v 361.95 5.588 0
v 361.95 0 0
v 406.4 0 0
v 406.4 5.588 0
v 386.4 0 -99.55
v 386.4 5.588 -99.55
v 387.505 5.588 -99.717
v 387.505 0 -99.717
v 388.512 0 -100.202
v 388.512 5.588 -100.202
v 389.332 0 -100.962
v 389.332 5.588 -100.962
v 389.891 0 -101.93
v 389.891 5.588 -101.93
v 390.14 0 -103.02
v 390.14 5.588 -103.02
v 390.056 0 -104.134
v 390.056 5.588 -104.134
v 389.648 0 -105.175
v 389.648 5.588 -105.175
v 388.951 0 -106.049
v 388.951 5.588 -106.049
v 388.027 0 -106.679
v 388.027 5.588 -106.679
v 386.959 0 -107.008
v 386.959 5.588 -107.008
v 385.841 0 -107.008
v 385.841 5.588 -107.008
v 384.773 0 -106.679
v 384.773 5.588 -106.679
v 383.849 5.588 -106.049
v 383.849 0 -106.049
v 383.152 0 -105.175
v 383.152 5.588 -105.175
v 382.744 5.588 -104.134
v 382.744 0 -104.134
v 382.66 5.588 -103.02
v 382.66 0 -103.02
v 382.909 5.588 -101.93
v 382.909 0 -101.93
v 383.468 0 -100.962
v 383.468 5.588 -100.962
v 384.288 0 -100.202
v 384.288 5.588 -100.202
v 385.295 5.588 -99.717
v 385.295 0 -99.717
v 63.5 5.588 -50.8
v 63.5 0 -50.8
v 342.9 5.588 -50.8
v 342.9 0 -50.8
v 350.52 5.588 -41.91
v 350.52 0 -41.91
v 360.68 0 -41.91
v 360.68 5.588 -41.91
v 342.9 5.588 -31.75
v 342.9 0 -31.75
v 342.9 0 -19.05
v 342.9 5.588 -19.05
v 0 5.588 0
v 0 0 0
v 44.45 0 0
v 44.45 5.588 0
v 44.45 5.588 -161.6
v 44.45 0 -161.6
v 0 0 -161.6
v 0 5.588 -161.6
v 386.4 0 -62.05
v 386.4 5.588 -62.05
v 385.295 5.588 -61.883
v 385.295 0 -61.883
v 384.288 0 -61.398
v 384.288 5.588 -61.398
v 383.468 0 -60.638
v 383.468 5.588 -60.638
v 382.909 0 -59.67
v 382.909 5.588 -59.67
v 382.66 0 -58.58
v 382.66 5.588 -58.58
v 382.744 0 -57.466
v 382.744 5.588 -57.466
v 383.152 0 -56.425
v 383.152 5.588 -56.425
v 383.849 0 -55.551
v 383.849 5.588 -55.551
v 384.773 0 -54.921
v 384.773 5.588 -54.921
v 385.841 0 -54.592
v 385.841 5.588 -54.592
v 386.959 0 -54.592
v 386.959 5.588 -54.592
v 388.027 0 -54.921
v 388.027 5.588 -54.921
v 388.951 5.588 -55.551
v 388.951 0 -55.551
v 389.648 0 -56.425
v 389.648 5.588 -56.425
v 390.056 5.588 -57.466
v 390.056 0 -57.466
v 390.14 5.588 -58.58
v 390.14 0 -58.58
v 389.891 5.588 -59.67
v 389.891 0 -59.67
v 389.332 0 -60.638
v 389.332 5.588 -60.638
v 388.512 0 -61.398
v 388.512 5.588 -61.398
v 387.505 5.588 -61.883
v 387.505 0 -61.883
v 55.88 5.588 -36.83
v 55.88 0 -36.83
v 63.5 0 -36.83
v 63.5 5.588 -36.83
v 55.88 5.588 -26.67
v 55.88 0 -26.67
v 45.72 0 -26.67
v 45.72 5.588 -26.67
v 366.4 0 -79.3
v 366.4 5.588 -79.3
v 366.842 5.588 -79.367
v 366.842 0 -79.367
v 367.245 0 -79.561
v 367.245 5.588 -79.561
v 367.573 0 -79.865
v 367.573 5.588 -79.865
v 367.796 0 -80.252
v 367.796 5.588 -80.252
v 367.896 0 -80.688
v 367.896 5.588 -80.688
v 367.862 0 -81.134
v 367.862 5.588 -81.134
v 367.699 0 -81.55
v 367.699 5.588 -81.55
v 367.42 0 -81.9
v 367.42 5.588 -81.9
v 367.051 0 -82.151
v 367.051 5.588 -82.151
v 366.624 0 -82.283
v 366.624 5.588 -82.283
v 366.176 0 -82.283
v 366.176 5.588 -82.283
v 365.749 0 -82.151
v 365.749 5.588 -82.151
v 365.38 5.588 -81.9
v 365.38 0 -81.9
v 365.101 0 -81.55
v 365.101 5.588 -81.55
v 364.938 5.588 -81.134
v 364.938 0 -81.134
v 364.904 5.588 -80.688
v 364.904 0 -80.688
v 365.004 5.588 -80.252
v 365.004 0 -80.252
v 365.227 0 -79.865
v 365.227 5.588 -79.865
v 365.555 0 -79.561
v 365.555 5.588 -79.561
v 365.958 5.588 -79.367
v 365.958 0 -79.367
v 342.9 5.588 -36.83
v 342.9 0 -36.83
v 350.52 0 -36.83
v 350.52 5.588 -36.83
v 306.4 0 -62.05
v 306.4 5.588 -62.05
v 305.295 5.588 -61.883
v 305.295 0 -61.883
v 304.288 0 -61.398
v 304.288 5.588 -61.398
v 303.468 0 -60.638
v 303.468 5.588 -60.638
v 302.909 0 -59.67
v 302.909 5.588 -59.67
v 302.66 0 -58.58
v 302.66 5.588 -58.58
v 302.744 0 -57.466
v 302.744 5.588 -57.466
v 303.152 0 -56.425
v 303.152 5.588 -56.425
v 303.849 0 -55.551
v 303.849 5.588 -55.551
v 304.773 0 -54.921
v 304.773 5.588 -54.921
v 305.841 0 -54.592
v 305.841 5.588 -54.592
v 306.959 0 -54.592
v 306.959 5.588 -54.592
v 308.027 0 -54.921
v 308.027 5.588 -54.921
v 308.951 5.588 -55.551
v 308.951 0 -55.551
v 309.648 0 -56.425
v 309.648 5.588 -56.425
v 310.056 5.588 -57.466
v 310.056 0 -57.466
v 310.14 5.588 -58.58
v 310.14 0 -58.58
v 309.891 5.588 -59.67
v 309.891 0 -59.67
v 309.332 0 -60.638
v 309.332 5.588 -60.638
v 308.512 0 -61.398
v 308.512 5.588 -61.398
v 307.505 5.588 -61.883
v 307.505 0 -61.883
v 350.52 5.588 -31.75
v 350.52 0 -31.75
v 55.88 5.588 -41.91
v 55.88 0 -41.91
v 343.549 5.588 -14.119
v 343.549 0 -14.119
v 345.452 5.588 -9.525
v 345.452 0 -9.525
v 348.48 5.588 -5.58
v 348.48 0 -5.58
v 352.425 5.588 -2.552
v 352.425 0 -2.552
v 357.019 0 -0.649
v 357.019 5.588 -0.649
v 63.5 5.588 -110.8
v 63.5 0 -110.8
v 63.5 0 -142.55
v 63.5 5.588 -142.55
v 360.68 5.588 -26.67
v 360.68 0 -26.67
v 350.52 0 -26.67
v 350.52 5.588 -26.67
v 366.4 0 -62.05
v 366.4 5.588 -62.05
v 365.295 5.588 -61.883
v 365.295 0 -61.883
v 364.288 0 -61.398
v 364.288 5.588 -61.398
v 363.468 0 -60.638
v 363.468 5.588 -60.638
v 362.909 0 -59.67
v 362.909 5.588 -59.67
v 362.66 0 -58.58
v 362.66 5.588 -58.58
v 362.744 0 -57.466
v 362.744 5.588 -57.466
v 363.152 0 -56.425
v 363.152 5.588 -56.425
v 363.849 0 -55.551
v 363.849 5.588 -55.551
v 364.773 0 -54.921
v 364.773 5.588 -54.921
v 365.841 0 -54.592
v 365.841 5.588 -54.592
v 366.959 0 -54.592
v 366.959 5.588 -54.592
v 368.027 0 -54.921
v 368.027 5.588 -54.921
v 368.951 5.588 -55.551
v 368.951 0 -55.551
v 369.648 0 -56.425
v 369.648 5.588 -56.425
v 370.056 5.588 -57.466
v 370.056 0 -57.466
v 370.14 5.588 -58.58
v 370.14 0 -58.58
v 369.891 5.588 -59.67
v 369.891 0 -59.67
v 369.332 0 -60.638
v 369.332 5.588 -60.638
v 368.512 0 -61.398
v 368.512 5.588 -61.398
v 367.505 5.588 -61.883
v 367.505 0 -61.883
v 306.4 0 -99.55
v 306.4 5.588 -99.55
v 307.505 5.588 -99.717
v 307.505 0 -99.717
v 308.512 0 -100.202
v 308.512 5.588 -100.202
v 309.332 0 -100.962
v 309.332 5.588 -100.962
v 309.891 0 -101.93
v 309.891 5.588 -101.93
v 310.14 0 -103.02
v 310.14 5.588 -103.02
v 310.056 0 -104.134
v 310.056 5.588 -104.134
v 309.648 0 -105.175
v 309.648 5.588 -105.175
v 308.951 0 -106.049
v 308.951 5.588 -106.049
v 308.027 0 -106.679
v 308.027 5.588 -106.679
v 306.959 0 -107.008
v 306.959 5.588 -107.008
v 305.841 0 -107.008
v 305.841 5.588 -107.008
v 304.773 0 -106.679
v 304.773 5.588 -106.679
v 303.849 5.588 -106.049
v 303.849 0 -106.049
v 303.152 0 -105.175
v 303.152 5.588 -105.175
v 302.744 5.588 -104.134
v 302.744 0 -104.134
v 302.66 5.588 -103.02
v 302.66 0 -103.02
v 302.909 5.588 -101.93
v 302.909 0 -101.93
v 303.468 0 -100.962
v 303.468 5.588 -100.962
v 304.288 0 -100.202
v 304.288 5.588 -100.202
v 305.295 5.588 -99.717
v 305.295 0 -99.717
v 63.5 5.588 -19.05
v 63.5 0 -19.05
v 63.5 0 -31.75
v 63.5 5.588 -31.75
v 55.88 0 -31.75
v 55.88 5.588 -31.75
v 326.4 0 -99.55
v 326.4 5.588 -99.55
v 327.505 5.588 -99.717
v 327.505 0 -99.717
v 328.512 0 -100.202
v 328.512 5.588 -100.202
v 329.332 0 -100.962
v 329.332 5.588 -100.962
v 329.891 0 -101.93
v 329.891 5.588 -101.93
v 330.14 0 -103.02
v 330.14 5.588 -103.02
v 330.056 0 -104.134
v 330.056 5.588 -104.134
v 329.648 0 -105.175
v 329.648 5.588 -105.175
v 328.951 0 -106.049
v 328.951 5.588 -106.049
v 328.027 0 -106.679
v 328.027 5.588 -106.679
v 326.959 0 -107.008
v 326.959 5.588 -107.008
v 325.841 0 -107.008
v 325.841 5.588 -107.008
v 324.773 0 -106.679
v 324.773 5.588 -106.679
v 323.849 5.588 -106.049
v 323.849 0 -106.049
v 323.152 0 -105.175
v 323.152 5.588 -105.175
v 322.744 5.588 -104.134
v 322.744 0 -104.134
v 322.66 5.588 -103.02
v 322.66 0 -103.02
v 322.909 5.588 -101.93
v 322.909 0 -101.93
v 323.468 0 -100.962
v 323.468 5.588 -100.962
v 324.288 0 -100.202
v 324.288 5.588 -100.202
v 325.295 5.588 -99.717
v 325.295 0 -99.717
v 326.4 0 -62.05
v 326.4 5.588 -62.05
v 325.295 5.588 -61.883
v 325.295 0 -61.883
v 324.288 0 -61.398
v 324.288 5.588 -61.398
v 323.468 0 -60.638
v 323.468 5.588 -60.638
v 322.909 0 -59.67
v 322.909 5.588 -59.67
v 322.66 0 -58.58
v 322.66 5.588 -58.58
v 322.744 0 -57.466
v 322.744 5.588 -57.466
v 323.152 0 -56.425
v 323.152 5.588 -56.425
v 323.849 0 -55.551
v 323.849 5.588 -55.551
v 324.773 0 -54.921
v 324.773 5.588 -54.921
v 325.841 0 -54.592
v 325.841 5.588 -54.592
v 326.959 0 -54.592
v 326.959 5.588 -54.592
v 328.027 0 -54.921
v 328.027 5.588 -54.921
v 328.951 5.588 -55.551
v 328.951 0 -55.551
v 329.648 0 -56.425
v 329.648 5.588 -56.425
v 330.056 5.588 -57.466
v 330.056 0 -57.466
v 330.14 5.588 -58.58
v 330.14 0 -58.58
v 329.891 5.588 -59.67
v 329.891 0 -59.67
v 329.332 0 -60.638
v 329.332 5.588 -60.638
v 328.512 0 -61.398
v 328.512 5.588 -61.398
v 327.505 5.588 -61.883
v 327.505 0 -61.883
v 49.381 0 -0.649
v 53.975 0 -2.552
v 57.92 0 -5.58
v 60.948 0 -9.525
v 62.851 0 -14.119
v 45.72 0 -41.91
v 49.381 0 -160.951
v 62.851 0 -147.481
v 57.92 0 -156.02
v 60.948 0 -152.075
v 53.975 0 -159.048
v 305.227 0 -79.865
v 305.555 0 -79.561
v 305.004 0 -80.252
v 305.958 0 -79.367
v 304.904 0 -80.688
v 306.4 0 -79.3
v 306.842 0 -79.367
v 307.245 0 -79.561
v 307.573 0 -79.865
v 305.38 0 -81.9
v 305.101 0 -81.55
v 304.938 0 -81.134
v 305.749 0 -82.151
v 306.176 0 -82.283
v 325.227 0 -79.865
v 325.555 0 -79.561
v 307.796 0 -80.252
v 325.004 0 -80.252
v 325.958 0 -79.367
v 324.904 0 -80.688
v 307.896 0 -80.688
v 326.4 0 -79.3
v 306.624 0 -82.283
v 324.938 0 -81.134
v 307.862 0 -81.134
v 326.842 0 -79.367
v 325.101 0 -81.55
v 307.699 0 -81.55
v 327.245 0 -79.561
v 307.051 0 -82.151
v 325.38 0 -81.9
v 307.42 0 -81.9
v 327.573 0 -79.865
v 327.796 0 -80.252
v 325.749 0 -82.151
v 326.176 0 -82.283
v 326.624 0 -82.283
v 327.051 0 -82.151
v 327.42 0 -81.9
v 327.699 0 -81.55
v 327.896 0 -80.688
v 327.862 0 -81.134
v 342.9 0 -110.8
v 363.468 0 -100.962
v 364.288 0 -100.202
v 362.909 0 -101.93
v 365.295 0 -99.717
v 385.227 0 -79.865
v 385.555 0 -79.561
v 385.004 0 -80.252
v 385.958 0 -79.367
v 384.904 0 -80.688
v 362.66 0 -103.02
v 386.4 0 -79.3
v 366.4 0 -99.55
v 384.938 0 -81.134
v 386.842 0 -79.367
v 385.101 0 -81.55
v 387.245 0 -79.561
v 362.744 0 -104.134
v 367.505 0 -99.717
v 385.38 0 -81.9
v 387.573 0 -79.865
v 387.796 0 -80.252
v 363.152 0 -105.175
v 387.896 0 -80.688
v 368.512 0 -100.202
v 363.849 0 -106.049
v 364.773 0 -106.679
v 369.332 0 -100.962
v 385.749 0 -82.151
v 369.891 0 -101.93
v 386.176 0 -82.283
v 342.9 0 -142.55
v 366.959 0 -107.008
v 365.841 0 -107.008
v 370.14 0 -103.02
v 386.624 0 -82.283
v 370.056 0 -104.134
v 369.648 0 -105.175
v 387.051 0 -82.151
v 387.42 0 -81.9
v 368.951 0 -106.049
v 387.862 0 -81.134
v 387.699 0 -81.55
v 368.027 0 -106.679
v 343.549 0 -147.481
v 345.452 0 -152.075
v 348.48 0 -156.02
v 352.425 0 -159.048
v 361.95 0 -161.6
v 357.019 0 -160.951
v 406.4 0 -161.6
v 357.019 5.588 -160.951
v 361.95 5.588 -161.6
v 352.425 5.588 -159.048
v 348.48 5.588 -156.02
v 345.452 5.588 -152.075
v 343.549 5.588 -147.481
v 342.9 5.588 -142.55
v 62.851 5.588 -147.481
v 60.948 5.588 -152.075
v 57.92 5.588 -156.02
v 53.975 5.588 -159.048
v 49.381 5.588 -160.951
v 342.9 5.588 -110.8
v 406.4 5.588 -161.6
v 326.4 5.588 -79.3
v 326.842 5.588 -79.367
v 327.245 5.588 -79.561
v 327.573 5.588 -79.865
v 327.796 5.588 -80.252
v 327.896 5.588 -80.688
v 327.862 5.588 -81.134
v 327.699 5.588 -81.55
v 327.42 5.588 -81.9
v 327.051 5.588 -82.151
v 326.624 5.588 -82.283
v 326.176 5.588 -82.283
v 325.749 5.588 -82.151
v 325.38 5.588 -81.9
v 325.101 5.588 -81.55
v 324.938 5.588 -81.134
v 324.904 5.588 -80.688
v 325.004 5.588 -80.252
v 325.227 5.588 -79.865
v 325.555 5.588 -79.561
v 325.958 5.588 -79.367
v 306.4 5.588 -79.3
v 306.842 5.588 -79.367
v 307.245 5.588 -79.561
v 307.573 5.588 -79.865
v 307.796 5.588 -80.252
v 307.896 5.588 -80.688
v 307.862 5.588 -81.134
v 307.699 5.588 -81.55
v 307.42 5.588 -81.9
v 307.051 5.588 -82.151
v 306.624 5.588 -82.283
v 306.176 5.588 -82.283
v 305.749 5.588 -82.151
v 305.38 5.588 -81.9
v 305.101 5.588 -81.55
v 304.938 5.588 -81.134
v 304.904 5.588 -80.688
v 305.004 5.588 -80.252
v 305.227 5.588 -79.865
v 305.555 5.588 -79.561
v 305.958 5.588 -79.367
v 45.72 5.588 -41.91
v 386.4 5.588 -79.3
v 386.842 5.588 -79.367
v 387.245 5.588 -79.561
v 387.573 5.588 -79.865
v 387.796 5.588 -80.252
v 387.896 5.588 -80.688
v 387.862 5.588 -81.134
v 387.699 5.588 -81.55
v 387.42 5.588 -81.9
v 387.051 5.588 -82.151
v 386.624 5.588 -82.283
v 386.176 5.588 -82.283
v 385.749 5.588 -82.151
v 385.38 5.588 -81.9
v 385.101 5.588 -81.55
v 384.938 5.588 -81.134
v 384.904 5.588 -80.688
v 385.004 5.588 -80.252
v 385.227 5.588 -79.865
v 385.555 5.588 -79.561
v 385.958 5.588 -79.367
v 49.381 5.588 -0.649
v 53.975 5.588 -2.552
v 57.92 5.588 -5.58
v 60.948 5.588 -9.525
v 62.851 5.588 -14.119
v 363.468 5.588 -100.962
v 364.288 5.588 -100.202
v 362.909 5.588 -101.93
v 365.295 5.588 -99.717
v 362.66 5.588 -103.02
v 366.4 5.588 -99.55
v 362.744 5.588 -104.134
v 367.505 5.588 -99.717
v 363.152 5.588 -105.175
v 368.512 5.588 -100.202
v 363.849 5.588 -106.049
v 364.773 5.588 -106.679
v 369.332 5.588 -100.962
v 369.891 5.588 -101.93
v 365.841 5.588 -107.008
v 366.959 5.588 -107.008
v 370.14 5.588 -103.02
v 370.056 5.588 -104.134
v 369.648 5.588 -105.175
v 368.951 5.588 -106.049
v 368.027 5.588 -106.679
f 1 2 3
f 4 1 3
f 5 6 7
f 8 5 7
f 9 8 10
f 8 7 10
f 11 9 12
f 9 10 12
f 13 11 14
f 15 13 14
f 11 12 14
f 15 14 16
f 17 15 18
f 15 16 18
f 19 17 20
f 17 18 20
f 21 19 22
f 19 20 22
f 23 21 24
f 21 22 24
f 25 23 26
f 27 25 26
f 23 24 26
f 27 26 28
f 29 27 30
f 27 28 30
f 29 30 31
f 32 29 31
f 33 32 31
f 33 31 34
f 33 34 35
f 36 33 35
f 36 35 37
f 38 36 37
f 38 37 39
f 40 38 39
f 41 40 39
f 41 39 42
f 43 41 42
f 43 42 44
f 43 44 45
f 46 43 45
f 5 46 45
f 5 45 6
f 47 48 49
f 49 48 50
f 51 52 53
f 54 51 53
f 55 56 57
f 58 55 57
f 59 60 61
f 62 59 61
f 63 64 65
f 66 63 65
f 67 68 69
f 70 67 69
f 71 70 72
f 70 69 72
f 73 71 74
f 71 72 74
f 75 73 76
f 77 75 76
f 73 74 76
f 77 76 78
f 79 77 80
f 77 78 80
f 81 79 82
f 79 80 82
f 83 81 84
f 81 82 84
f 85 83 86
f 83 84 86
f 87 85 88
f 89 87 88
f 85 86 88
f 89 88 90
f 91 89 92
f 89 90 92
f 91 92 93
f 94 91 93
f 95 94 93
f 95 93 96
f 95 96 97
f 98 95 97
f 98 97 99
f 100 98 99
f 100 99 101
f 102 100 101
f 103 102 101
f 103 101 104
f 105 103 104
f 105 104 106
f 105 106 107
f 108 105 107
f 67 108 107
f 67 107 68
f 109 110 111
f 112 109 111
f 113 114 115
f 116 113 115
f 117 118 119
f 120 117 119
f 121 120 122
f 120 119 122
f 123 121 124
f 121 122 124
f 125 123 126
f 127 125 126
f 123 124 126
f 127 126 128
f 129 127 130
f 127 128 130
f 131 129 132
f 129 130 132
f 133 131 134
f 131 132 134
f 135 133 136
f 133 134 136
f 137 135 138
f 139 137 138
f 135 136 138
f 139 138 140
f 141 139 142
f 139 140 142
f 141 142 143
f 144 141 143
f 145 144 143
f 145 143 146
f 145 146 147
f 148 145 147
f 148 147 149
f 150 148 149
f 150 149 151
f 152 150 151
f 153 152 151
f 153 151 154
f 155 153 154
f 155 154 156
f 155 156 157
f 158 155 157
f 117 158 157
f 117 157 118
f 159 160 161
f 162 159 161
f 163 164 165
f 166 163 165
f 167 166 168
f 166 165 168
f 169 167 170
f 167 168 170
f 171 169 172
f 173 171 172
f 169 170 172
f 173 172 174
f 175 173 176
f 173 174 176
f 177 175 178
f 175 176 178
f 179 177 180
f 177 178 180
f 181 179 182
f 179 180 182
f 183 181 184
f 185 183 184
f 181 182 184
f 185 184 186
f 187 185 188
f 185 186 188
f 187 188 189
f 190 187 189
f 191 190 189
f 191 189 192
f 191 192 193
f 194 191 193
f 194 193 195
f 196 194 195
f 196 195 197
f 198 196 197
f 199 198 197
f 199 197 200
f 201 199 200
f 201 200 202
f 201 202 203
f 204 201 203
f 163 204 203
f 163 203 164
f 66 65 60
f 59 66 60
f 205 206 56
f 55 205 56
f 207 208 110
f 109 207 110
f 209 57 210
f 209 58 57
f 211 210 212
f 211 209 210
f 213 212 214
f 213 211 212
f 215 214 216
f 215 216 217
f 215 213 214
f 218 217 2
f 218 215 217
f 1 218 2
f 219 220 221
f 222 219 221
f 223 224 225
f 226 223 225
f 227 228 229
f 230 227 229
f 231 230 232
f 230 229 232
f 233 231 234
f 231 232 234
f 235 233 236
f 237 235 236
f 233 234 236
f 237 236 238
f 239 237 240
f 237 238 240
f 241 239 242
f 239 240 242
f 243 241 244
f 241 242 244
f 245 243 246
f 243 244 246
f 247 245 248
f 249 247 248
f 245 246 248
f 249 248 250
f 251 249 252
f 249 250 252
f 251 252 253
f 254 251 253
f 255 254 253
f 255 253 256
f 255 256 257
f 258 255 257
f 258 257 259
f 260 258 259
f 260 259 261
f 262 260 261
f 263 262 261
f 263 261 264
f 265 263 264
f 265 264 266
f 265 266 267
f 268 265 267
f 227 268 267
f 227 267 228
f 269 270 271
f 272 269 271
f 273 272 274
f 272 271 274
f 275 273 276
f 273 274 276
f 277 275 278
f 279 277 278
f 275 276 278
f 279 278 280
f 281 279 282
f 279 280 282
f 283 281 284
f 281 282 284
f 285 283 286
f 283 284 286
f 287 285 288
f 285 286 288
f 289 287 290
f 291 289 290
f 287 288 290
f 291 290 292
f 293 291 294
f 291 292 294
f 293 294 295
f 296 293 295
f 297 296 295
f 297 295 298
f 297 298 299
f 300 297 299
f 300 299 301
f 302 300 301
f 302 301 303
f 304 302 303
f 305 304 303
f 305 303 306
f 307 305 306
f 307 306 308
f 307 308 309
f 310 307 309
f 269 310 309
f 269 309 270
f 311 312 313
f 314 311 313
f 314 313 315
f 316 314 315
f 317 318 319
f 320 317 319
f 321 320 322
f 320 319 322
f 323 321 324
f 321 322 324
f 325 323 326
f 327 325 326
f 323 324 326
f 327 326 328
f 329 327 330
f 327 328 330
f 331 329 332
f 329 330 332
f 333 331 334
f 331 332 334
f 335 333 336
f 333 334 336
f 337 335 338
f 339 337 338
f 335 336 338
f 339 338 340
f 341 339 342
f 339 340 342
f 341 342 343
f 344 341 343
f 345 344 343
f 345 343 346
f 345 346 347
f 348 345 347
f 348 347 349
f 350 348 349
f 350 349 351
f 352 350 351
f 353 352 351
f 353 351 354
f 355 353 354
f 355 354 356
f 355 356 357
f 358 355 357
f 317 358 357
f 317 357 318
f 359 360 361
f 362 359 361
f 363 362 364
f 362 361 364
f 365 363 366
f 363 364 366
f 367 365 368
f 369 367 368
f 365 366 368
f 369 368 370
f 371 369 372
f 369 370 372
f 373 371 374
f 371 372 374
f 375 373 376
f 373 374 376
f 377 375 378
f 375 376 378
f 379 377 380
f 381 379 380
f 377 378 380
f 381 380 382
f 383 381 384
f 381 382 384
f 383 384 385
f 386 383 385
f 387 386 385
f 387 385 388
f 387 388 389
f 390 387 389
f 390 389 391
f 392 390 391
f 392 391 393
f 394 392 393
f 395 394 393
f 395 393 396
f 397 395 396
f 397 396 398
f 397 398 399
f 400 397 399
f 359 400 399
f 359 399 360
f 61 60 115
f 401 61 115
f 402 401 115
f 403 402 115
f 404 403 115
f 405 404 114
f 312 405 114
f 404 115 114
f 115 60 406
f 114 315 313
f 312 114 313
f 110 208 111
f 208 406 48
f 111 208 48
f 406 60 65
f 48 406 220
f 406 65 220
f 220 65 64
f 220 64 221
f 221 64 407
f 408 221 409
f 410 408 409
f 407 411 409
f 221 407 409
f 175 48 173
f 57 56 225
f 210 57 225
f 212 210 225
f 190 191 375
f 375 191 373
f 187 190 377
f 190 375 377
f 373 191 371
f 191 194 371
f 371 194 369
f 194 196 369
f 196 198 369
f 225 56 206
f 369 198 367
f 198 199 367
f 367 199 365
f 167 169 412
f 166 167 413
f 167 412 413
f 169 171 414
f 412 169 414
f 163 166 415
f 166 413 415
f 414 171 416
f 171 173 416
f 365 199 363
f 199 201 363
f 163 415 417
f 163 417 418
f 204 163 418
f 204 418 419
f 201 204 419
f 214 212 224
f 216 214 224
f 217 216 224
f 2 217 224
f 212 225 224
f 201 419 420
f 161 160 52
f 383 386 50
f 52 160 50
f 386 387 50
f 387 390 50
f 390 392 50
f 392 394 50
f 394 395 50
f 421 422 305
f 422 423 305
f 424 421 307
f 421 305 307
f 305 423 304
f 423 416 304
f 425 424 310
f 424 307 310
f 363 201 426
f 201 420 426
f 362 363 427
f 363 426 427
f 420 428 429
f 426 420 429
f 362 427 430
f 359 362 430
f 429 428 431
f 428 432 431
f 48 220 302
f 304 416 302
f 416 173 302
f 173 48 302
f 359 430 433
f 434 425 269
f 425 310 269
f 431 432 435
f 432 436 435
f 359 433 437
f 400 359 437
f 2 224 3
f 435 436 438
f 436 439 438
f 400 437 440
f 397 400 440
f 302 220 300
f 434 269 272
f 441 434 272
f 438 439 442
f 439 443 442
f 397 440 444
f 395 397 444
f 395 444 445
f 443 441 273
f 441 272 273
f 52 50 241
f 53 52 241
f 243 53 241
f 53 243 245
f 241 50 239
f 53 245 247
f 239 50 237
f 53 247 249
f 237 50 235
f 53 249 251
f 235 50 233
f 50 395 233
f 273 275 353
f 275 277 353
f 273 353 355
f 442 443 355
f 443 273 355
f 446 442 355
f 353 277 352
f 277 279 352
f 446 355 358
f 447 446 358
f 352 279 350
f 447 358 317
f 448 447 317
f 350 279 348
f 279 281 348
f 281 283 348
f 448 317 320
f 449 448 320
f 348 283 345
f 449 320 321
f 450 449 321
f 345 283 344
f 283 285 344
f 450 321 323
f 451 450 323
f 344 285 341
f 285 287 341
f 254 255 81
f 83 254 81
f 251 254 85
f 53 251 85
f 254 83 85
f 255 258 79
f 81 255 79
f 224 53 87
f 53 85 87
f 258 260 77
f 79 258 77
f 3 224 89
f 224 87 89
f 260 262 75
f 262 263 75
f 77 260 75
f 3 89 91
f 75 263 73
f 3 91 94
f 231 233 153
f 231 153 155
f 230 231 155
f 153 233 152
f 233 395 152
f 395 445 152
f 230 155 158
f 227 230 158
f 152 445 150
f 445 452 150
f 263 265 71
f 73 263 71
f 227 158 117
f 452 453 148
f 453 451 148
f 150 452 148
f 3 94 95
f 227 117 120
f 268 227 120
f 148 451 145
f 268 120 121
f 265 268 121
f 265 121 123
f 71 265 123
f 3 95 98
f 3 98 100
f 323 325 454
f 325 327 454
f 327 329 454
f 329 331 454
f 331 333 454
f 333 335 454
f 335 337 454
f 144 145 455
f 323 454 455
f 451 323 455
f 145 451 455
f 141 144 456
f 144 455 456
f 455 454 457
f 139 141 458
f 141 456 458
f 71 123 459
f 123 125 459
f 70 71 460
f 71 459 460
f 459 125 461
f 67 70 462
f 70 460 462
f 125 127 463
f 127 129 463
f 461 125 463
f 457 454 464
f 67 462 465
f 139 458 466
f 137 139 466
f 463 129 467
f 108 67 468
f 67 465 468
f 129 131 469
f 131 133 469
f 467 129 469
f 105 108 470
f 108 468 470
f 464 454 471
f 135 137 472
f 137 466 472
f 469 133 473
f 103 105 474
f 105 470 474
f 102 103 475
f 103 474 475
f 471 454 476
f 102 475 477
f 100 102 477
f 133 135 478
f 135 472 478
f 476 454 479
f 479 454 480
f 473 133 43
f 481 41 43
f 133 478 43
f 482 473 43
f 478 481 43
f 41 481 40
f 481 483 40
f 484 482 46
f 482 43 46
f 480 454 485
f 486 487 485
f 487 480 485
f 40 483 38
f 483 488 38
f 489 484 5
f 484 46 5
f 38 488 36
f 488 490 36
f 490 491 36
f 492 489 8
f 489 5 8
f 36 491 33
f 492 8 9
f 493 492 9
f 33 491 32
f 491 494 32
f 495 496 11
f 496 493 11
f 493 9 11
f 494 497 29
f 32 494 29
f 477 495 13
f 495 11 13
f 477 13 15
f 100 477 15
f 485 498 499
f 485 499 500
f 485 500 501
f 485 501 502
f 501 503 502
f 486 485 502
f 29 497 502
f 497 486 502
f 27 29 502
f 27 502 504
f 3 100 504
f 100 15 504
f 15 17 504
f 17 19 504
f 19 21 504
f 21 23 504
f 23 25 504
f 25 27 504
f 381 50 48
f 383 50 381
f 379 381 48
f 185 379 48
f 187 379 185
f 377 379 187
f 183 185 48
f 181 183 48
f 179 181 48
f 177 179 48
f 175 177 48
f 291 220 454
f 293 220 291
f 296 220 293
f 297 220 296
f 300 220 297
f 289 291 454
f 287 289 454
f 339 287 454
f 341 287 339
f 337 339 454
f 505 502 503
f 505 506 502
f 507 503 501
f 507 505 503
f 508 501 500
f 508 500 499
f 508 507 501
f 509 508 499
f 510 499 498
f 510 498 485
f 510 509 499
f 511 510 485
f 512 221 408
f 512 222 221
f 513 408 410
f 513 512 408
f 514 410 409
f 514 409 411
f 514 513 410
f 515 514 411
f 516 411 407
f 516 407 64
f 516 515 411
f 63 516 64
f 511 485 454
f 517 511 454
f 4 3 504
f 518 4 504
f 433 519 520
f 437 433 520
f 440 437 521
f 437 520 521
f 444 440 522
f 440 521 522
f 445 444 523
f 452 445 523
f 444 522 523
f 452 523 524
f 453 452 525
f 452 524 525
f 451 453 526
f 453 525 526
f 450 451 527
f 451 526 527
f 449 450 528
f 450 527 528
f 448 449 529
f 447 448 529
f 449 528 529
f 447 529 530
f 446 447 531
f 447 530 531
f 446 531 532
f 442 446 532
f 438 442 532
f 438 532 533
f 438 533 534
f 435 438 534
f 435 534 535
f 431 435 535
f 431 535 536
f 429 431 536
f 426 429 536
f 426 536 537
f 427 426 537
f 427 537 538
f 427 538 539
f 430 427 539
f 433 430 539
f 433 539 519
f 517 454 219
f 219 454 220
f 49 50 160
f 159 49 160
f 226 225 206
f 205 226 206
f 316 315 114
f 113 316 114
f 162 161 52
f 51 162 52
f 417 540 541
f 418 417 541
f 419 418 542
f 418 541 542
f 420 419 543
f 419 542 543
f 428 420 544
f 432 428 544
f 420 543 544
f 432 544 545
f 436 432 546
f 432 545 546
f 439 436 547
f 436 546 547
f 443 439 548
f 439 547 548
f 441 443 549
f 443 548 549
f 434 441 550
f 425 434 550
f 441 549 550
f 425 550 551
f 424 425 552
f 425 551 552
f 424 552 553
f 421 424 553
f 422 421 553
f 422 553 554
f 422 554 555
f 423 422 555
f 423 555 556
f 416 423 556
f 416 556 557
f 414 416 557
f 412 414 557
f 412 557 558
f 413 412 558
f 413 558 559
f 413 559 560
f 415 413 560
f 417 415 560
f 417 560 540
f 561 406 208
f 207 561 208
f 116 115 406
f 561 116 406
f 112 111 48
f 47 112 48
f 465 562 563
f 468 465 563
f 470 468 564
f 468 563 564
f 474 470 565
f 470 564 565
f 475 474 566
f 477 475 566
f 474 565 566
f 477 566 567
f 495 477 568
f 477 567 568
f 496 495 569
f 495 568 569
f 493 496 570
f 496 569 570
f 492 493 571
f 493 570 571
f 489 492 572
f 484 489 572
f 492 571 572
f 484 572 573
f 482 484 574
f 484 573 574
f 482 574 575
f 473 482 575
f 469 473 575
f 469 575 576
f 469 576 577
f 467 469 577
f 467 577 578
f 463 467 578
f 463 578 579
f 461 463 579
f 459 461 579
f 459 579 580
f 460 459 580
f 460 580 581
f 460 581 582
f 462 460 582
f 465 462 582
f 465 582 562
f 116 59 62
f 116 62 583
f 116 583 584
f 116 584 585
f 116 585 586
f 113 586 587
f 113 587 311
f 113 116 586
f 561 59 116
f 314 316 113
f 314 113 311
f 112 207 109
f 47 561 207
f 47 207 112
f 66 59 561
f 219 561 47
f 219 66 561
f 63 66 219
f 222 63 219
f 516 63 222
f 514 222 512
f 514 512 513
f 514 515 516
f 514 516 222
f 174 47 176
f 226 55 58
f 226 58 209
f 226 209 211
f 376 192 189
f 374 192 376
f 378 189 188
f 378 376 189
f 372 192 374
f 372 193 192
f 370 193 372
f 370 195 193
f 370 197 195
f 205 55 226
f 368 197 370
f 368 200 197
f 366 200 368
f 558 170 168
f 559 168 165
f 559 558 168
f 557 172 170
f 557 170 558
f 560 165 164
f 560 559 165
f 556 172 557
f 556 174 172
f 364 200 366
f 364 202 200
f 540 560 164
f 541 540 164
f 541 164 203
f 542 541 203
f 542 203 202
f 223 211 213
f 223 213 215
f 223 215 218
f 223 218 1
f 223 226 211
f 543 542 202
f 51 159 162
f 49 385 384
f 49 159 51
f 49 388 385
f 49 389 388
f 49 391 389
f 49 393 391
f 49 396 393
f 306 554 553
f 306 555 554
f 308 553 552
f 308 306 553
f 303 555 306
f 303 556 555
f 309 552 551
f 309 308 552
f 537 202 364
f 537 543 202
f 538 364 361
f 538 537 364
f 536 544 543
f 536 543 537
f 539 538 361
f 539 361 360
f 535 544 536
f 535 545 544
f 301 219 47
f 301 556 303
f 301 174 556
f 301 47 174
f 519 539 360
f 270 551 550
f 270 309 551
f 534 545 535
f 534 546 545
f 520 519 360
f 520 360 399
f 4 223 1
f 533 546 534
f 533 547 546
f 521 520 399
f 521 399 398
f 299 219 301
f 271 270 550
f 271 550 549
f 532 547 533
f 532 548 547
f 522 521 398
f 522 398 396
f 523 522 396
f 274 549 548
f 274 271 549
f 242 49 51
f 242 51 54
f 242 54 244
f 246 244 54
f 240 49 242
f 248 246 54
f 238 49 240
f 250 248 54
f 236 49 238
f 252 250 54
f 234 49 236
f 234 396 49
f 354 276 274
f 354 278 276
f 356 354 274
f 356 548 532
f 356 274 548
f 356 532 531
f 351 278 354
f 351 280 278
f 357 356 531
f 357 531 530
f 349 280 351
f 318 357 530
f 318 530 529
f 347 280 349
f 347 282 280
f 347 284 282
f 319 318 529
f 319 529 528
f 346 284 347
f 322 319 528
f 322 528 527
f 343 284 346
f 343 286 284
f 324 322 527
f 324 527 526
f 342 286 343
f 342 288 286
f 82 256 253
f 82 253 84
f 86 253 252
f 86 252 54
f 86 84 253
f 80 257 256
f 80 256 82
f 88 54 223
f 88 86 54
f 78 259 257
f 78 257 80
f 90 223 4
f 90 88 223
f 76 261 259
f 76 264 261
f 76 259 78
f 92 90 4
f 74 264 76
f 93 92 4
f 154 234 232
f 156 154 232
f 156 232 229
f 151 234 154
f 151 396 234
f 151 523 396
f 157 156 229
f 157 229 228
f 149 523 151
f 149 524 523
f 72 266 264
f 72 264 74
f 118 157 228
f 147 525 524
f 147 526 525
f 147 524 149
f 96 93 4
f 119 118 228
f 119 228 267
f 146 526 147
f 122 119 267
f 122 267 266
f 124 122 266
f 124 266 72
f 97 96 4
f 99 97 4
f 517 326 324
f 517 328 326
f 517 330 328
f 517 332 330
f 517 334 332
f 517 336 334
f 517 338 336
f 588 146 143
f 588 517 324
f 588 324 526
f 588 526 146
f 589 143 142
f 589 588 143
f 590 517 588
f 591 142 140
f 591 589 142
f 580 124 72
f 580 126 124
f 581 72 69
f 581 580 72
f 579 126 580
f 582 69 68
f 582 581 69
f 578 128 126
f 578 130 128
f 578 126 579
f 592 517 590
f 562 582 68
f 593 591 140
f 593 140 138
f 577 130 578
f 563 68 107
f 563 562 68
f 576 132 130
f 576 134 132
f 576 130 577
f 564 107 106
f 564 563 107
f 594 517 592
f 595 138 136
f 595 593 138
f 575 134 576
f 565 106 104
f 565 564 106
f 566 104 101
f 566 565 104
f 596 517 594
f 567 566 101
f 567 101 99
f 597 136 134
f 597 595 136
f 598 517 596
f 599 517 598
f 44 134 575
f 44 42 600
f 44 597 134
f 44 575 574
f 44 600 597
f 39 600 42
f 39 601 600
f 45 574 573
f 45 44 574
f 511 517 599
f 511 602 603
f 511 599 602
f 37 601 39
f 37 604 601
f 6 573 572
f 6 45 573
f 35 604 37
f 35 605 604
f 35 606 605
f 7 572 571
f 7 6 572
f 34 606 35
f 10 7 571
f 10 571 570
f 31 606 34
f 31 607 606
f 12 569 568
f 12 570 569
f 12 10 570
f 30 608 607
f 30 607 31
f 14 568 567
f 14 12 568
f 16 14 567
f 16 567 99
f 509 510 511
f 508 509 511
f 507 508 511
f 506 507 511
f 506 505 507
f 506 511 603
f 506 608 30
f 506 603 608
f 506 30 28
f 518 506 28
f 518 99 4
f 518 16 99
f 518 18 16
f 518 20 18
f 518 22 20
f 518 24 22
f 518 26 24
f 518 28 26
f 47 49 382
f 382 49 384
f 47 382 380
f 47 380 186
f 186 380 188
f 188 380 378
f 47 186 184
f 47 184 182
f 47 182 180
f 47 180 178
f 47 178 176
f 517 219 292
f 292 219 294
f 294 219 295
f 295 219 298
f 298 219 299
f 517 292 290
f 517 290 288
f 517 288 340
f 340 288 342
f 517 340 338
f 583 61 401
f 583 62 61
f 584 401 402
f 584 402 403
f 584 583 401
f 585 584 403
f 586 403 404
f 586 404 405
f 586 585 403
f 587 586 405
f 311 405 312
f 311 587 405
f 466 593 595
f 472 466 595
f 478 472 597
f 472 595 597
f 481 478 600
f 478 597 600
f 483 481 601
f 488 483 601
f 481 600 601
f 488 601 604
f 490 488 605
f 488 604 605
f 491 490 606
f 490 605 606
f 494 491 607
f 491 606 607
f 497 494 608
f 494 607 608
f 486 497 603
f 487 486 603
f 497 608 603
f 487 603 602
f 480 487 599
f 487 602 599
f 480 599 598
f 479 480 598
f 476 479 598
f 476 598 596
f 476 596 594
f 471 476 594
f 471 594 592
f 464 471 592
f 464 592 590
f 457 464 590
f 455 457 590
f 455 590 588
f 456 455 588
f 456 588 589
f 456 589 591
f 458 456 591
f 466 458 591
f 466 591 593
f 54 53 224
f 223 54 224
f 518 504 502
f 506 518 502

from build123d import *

# Parameters (mm, degrees)
BOSS_EXTRUDE1_DEPTH = 5.588
FILLET1_R           = 19.05
SKETCH2_R           = 1.5
SKETCH2_R_2         = 3.75
CUT_EXTRUDE1_DEPTH  = 438.386266067


with BuildPart() as part:
    # Sketch1 → Boss-Extrude1 (new body)
    with BuildSketch(Plane(origin=(0, 0, 0), x_dir=(1, 0, 0), z_dir=(0, 1, 0))):
        Polygon((0, 161.6), (0, 0), (63.5, 0), (63.5, 31.75), (55.88, 31.75), (55.88, 26.67), (45.72, 26.67), (45.72, 41.91), (55.88, 41.91), (55.88, 36.83), (63.5, 36.83), (63.5, 50.8), (342.9, 50.8), (342.9, 36.83), (350.52, 36.83), (350.52, 41.91), (360.68, 41.91), (360.68, 26.67), (350.52, 26.67), (350.52, 31.75), (342.9, 31.75), (342.9, 0), (406.4, 0), (406.4, 161.6), (342.9, 161.6), (342.9, 110.8), (63.5, 110.8), (63.5, 161.6), align=None)
    extrude(amount=BOSS_EXTRUDE1_DEPTH)

    # Fillet1
    fillet1_edges = [part.edges().sort_by_distance(p)[0] for p in [
        (63.5, 2.794, 0),
        (63.5, 2.794, -161.6),
        (342.9, 2.794, -161.6),
        (342.9, 2.794, 0),
    ]]
    fillet(fillet1_edges, radius=FILLET1_R)

    # Sketch2 → Cut-Extrude1 (cut, through all)
    with BuildSketch(Plane(origin=(0, 5.588, 0), x_dir=(1, 0, 0), z_dir=(0, 1, 0))):
        with Locations(Location((366.4, 80.8, 0), (0, 0, 270))):
            Circle(SKETCH2_R)
        with Locations(Location((386.4, 80.8, 0), (0, 0, 270))):
            Circle(SKETCH2_R)
        with Locations(Location((366.4, 103.3, 0), (0, 0, 270))):
            Circle(SKETCH2_R_2)
        with Locations(Location((386.4, 103.3, 0), (0, 0, 270))):
            Circle(SKETCH2_R_2)
        with Locations(Location((386.4, 58.3, 0), (0, 0, 90))):
            Circle(SKETCH2_R_2)
        with Locations(Location((366.4, 58.3, 0), (0, 0, 90))):
            Circle(SKETCH2_R_2)
        with Locations(Location((306.4, 103.3, 0), (0, 0, 270))):
            Circle(SKETCH2_R_2)
        with Locations(Location((326.4, 103.3, 0), (0, 0, 270))):
            Circle(SKETCH2_R_2)
        with Locations(Location((326.4, 80.8, 0), (0, 0, 270))):
            Circle(SKETCH2_R)
        with Locations(Location((306.4, 80.8, 0), (0, 0, 270))):
            Circle(SKETCH2_R)
        with Locations(Location((306.4, 58.3, 0), (0, 0, 90))):
            Circle(SKETCH2_R_2)
        with Locations(Location((326.4, 58.3, 0), (0, 0, 90))):
            Circle(SKETCH2_R_2)
    extrude(amount=-CUT_EXTRUDE1_DEPTH, mode=Mode.SUBTRACT)


solid = part.part
